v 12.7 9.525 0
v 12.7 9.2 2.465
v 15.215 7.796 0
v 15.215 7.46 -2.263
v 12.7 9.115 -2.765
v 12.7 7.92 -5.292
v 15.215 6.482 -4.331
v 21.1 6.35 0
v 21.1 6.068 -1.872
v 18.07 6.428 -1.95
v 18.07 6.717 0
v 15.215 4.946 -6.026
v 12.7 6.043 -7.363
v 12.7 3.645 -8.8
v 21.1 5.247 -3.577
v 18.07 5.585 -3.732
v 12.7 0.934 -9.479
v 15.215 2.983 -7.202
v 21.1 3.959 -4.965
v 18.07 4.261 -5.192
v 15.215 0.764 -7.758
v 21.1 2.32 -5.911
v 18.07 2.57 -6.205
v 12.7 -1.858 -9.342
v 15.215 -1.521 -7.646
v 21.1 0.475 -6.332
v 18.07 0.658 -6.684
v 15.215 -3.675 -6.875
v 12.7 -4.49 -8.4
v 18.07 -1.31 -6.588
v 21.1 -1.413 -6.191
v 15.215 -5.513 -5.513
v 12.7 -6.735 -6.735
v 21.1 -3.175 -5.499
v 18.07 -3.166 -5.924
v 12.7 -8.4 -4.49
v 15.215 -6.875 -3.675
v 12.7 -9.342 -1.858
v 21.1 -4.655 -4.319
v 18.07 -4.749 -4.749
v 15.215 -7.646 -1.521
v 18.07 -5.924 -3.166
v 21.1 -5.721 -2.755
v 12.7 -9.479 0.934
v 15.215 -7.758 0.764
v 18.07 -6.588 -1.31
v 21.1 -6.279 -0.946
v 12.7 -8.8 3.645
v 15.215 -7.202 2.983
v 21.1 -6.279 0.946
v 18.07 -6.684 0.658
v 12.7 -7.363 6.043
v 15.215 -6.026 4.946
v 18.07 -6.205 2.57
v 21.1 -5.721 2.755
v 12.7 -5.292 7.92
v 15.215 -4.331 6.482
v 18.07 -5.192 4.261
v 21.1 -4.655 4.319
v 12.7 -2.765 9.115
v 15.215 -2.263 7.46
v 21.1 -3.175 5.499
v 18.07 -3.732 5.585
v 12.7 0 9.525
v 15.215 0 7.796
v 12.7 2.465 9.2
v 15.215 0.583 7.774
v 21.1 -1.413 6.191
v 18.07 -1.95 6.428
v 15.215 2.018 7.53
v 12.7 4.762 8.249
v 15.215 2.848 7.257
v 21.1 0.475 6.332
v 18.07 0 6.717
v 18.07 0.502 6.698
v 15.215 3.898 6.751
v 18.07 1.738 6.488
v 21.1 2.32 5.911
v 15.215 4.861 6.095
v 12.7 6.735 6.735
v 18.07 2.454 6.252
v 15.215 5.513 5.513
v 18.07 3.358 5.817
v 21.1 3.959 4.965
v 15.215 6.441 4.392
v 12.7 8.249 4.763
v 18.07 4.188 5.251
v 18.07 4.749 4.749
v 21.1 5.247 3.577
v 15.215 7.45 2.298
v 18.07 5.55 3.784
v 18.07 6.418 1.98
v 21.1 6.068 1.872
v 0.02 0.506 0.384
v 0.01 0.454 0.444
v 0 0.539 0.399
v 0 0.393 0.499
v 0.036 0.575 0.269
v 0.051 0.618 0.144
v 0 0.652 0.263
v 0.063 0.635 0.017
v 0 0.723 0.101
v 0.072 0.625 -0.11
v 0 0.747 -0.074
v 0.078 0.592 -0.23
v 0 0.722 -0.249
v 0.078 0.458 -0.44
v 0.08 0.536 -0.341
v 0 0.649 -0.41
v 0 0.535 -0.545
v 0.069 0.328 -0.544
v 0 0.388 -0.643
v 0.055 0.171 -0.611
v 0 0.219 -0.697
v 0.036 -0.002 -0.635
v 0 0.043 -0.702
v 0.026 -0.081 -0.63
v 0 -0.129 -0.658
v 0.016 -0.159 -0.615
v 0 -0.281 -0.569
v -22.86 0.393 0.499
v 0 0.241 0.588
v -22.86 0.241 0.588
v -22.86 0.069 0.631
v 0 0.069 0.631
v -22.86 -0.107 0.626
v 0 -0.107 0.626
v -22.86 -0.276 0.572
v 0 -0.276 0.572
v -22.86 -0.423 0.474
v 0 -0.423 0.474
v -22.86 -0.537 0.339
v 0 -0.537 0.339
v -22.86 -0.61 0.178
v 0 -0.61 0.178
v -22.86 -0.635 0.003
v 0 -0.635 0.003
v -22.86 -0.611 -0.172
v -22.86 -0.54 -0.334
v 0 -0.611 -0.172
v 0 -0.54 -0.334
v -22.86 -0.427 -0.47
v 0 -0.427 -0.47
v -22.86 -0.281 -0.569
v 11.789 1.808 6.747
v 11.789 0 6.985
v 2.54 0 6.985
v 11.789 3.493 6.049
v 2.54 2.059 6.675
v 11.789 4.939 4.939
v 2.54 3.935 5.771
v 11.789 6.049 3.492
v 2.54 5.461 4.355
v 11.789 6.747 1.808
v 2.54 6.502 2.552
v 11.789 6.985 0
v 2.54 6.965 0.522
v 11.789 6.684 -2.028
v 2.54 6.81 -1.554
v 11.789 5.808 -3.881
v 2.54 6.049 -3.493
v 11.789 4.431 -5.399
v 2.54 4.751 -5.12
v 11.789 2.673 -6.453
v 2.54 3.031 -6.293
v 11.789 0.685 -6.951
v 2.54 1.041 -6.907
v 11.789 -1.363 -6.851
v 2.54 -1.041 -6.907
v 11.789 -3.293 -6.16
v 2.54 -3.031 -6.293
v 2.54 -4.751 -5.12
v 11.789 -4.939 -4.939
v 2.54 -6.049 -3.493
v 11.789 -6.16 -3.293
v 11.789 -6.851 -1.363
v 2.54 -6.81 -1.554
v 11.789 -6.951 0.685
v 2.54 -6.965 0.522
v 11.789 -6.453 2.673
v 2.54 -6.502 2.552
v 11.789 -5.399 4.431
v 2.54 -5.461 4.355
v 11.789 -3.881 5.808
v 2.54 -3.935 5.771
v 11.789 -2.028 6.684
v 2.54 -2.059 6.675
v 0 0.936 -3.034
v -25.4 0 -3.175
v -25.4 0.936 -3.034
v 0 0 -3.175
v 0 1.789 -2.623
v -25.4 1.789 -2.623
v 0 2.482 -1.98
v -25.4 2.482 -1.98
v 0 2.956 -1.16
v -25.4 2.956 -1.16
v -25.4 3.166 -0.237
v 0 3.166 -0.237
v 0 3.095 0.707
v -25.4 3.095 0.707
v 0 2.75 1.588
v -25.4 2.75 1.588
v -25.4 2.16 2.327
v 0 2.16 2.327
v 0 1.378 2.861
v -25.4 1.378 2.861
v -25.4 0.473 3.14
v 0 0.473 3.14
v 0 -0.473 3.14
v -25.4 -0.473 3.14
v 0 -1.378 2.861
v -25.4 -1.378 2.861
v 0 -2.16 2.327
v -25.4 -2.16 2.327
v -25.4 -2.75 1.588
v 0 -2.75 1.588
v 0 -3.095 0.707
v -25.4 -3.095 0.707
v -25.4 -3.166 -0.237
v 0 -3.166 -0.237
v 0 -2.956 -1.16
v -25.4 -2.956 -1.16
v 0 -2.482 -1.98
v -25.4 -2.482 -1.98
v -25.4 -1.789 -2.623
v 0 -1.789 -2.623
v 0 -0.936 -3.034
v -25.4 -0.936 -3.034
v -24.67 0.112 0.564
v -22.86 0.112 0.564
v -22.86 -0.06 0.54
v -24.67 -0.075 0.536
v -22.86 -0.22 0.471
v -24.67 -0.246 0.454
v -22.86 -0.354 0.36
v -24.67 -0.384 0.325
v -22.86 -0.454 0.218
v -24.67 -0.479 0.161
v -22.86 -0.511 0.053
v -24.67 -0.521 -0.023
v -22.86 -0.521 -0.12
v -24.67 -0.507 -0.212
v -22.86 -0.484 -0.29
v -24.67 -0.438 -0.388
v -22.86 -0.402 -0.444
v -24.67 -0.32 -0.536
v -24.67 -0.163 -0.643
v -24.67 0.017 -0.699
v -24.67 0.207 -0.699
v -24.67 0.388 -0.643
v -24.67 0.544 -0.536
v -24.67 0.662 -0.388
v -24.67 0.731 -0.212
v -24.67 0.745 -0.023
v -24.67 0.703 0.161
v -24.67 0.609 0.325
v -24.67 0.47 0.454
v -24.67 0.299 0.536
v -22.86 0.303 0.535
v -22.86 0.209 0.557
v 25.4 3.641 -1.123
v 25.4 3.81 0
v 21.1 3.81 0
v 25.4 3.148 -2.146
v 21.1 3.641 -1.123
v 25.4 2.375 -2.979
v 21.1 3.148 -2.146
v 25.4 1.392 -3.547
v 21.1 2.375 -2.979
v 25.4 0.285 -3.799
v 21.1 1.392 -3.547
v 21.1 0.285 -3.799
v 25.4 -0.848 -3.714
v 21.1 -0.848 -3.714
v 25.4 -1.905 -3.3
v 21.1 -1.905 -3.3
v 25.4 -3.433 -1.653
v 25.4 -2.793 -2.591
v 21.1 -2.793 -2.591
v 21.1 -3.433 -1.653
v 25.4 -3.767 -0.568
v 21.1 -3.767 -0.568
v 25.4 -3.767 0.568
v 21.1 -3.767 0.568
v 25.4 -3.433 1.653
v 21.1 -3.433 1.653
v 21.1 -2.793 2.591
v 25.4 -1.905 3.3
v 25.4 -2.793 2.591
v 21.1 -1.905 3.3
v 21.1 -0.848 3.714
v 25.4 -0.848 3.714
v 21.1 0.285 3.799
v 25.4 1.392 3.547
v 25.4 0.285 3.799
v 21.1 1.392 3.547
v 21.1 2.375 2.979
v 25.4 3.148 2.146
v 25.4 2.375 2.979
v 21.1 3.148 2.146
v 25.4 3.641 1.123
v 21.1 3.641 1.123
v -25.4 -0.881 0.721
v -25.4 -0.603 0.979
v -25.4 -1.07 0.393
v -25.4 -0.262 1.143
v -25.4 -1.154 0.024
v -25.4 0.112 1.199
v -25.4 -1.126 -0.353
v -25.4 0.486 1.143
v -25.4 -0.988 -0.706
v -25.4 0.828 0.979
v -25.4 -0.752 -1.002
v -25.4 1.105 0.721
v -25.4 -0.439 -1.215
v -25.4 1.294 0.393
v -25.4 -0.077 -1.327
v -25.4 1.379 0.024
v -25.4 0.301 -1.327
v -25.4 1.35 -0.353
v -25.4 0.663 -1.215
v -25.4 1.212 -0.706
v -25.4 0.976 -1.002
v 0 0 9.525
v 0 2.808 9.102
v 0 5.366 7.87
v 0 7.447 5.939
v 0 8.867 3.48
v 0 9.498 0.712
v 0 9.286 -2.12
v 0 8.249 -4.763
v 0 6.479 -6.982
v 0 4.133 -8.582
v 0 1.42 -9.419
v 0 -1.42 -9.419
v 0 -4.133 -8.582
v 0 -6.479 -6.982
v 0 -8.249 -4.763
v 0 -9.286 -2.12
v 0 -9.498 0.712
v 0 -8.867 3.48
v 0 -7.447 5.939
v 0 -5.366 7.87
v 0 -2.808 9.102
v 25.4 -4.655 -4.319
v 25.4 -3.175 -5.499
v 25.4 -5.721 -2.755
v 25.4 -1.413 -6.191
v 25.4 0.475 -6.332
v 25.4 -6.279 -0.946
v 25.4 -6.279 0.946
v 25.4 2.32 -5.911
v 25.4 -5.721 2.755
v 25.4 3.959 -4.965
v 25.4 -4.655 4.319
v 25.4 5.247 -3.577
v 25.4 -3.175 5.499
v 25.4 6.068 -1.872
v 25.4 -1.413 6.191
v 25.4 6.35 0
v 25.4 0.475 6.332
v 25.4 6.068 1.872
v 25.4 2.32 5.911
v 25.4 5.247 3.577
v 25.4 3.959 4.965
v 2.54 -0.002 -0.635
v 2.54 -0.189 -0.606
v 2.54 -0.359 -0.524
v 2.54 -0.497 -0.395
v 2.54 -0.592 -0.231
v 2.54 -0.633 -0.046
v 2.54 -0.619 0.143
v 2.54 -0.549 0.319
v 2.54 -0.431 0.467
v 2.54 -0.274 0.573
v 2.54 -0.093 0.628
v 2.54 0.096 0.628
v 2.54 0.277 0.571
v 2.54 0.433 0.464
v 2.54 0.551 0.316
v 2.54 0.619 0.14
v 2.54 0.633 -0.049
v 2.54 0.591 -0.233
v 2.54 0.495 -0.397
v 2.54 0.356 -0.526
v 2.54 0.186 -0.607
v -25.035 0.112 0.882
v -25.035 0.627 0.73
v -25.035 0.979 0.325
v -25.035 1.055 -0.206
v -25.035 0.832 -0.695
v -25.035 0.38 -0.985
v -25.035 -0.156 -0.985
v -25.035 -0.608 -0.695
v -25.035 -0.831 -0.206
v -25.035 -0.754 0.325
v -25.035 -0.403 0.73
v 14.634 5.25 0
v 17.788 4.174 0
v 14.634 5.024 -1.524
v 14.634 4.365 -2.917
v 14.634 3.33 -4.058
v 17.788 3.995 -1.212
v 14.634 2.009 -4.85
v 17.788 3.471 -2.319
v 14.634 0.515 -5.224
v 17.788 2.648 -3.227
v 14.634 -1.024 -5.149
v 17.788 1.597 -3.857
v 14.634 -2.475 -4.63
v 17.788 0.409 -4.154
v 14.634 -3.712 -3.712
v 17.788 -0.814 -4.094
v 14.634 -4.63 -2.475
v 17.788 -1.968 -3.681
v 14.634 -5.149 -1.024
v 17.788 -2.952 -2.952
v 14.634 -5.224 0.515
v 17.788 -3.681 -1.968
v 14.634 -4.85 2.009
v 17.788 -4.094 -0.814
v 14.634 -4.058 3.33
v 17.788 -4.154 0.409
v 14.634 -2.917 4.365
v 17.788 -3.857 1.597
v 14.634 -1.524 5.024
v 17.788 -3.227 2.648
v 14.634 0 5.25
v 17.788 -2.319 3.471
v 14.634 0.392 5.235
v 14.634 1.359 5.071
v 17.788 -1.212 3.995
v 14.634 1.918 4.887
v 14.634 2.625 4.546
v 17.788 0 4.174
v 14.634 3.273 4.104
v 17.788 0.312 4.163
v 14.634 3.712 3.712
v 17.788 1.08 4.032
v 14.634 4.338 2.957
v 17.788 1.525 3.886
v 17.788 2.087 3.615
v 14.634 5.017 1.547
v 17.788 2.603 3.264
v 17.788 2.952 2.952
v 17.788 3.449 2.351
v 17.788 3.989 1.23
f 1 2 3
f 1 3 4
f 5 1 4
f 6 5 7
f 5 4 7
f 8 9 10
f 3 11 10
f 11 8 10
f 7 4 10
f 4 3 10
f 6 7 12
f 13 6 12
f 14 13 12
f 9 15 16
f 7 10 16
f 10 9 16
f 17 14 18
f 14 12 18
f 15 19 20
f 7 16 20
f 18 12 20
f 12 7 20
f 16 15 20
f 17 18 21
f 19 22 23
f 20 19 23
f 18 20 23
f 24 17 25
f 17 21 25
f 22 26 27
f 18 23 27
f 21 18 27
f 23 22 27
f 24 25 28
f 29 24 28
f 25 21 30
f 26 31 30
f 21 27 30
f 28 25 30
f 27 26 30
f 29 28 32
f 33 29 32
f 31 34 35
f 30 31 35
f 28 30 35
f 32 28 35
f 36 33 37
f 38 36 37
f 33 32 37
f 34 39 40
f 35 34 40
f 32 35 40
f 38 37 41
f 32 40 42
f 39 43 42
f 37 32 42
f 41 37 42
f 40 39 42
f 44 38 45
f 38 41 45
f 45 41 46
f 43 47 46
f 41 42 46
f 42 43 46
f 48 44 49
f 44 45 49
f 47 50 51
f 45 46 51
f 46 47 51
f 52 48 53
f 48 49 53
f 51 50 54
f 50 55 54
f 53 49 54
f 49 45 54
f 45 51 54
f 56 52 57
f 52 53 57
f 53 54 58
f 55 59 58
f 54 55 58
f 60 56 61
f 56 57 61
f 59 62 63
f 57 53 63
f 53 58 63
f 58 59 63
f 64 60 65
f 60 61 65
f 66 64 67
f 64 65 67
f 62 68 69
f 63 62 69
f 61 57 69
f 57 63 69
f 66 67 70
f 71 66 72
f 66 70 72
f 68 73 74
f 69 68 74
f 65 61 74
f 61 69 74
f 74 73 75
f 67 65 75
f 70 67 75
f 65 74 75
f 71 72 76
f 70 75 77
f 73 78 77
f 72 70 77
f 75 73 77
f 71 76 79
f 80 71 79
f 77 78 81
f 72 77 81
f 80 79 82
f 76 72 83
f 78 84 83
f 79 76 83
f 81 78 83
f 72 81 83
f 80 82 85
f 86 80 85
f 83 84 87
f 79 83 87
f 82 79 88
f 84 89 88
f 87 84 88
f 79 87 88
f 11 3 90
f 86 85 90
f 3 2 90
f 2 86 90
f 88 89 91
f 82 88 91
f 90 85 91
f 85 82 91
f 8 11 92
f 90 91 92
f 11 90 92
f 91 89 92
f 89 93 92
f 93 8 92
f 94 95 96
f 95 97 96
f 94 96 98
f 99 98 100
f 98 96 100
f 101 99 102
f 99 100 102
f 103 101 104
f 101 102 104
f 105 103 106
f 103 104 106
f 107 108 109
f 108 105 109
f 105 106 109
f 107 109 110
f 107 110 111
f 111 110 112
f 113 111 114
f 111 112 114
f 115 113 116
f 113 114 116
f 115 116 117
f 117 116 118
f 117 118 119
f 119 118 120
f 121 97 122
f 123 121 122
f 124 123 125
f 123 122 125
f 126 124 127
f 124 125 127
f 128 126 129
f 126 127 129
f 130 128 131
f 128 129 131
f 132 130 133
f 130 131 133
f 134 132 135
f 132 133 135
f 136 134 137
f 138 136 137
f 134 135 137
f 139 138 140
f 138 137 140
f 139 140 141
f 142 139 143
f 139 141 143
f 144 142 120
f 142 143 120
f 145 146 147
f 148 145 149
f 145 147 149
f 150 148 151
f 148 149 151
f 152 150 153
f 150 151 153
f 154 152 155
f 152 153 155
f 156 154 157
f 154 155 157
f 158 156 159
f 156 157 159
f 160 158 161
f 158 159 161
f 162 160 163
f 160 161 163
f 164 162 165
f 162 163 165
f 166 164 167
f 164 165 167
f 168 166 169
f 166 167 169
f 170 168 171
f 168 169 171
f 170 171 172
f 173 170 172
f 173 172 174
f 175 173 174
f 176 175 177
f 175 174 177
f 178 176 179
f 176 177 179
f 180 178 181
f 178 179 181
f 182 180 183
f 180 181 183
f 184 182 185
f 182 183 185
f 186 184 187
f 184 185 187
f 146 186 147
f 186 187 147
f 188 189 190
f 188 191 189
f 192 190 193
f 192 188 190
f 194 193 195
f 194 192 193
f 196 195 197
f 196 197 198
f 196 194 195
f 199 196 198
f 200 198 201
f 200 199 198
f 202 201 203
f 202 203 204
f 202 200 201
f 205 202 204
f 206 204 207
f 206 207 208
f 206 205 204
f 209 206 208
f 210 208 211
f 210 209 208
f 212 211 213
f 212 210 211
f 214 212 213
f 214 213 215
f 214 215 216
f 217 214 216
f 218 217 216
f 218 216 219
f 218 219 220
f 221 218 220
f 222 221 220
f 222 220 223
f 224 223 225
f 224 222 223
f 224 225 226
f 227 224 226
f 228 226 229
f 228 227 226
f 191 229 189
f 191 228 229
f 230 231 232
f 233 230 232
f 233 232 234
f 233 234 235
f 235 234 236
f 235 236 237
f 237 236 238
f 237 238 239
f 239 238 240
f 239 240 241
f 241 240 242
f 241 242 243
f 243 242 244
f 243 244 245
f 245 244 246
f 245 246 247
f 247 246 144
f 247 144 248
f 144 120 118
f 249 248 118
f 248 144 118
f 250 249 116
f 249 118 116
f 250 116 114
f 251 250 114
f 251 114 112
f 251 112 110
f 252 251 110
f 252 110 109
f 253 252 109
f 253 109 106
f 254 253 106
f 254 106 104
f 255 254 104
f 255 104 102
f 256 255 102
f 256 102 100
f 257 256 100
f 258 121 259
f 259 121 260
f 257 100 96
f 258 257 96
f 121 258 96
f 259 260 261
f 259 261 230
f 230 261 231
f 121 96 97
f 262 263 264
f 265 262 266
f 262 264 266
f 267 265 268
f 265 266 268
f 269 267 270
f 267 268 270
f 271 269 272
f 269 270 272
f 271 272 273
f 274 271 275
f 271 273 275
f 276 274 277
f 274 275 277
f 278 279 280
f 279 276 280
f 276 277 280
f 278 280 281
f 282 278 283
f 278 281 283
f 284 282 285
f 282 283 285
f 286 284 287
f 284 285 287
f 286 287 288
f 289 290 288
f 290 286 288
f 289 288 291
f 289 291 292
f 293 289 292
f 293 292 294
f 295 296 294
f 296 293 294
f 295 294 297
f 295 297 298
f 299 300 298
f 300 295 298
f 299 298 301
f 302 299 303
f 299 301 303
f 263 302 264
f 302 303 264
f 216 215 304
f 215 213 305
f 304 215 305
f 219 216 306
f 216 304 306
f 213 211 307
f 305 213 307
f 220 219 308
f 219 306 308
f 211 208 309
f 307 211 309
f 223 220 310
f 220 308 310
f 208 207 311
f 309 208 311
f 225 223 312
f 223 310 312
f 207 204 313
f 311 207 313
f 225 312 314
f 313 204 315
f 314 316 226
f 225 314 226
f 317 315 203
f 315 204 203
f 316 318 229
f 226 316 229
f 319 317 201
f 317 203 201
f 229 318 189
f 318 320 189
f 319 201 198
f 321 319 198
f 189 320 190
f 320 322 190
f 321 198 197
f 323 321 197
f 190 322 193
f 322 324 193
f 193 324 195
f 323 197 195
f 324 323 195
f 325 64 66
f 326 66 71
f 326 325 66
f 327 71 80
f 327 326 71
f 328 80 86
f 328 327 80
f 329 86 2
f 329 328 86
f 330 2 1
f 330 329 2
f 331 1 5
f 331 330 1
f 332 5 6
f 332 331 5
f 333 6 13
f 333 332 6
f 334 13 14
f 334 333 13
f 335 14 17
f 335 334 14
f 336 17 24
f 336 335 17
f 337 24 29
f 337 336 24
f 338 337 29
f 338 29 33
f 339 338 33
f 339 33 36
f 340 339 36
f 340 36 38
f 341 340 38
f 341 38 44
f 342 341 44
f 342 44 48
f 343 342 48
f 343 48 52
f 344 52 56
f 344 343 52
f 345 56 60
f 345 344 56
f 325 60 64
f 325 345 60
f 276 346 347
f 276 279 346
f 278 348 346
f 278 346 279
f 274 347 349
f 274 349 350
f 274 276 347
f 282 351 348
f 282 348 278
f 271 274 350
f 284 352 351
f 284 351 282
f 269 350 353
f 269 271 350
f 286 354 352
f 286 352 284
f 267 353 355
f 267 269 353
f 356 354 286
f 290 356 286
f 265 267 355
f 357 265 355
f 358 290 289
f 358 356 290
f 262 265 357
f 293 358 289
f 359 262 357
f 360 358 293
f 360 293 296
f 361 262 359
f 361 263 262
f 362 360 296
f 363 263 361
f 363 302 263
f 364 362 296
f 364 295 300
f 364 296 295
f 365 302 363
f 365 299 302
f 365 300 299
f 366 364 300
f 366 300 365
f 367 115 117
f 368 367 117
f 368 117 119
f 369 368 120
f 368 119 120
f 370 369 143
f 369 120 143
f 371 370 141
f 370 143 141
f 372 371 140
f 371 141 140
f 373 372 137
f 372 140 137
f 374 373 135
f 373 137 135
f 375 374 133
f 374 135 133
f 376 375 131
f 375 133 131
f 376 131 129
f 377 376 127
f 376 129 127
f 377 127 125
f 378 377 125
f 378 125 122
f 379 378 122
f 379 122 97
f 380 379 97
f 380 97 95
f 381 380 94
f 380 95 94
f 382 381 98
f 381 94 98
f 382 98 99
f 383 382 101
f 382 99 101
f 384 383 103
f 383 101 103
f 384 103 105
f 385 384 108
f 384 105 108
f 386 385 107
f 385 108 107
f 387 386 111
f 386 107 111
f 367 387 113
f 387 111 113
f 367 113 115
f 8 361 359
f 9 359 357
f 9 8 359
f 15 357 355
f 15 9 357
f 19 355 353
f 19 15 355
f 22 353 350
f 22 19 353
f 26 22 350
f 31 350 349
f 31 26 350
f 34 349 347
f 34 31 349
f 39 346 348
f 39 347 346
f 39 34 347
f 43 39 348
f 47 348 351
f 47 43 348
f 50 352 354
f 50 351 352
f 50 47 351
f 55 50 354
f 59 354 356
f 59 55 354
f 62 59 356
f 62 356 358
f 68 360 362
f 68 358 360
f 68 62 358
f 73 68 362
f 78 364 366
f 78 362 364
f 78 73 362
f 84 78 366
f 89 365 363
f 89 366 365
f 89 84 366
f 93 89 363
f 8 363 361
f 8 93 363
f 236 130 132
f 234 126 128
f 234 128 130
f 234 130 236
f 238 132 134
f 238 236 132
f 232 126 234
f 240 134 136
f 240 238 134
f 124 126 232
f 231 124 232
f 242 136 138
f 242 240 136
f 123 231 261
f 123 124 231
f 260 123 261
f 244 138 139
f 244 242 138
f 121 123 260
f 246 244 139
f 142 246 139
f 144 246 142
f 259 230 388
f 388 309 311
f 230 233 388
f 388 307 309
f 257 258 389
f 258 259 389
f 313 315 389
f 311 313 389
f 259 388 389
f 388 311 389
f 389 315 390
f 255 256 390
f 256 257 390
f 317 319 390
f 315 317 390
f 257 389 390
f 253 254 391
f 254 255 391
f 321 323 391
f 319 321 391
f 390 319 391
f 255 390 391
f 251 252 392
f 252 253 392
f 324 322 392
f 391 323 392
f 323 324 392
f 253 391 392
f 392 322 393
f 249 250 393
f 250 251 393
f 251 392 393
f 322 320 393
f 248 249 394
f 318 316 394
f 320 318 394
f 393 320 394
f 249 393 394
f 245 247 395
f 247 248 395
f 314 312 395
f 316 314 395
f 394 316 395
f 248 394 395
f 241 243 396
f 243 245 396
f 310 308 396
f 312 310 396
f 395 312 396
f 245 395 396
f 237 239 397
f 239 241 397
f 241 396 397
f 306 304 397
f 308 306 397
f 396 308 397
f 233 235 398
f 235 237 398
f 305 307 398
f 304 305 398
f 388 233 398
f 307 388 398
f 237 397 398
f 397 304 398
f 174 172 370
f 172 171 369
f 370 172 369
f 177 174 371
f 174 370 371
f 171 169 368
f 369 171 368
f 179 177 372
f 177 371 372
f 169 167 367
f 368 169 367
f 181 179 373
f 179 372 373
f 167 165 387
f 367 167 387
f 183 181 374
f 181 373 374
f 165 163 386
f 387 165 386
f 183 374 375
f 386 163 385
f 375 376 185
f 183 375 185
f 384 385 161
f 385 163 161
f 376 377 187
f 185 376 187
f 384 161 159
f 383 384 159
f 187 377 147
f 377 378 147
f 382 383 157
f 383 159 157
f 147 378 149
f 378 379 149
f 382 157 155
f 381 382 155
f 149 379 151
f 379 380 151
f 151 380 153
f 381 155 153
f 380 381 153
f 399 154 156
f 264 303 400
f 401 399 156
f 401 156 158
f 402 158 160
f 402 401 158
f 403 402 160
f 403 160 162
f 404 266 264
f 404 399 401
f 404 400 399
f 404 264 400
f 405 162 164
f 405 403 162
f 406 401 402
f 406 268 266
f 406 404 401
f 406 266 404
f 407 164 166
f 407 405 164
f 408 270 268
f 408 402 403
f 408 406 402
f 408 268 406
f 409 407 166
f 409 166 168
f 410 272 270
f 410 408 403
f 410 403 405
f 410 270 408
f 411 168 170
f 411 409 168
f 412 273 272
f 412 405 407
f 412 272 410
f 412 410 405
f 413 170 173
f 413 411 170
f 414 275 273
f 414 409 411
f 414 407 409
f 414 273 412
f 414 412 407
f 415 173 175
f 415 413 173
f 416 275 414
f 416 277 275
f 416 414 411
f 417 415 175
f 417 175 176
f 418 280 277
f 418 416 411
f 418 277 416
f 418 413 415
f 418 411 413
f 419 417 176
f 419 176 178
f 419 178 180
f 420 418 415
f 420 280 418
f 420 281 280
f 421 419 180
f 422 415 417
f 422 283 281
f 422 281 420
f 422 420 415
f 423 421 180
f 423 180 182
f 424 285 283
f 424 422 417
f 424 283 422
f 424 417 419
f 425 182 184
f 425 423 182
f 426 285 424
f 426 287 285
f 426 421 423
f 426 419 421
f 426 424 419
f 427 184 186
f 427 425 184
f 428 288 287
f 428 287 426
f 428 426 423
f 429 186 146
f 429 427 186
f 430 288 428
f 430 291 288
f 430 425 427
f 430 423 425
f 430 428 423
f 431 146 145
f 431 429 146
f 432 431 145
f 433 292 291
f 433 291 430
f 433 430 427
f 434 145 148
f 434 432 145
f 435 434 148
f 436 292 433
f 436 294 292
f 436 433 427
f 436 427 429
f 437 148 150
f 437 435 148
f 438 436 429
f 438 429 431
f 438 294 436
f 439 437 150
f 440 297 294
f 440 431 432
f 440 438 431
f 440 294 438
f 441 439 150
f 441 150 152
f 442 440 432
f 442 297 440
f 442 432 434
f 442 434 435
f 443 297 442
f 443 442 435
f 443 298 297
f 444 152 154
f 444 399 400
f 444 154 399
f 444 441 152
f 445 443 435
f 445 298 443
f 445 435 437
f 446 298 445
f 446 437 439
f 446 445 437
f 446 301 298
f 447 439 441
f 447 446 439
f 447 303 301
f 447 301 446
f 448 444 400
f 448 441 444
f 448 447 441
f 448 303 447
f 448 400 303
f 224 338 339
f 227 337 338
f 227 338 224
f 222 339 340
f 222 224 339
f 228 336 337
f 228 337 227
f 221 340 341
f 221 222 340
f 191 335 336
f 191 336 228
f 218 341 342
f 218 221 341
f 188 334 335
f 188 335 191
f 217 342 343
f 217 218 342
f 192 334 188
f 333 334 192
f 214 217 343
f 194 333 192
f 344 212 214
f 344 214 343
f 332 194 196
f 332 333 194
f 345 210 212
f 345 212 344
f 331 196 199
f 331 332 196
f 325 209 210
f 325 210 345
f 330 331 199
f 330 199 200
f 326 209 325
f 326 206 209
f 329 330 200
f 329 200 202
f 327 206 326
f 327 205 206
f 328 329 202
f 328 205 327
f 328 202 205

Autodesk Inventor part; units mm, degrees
ref_plane "YZ Plane" through (0, 0, 0) normal (1, 0, 0) x (0, 1, 0)
ref_plane "XZ Plane" through (0, 0, 0) normal (0, 1, 0) x (-1, 0, 0)
ref_plane "XY Plane" through (0, 0, 0) normal (0, 0, 1) x (1, 0, 0)
sketch "Sketch1" plane through (0, 0, 0) normal (1, 0, 0) x (0, 1, 0)
  circle A0 centre (0, 0) radius 3.175
  circle A1 centre (0, 0) radius 6.35
  dimension "d0" = 6.35
  dimension "d1" = 12.7
extrude "Extrusion1" add sketch "Sketch1" along normal blind 25.4
sketch "Sketch2" plane through (25.4, 0, 0) normal (1, 0, 0) x (0, 0, -1)
  circle A0 centre (0, 0) radius 3.175 projected
  circle A1 centre (0, 0) radius 3.175
extrude "Extrusion2" add sketch "Sketch2" against normal blind 50.8
sketch "Sketch3" plane through (0, 0, 0) normal (-1, 0, 0) x (0, 0, 1)
  circle A0 centre (0, 0) radius 9.525
  dimension "d6" = 19.05
extrude "Extrusion3" add sketch "Sketch3" against normal blind 12.7
fillet "Fillet1" radius 12.7 1 edges at (12.7, -6.35, 0)
shell "Shell1" thickness 2.54 removed faces 1 at (25.4, -1.8127, -0.4771)
hole "Hole1" at (-25.4, 0.1121, -0.0708) direction (1, 0, 0) diameter 1.27 depth 25.4 tip angle 118 countersink diameter 2.54 countersink angle 82
